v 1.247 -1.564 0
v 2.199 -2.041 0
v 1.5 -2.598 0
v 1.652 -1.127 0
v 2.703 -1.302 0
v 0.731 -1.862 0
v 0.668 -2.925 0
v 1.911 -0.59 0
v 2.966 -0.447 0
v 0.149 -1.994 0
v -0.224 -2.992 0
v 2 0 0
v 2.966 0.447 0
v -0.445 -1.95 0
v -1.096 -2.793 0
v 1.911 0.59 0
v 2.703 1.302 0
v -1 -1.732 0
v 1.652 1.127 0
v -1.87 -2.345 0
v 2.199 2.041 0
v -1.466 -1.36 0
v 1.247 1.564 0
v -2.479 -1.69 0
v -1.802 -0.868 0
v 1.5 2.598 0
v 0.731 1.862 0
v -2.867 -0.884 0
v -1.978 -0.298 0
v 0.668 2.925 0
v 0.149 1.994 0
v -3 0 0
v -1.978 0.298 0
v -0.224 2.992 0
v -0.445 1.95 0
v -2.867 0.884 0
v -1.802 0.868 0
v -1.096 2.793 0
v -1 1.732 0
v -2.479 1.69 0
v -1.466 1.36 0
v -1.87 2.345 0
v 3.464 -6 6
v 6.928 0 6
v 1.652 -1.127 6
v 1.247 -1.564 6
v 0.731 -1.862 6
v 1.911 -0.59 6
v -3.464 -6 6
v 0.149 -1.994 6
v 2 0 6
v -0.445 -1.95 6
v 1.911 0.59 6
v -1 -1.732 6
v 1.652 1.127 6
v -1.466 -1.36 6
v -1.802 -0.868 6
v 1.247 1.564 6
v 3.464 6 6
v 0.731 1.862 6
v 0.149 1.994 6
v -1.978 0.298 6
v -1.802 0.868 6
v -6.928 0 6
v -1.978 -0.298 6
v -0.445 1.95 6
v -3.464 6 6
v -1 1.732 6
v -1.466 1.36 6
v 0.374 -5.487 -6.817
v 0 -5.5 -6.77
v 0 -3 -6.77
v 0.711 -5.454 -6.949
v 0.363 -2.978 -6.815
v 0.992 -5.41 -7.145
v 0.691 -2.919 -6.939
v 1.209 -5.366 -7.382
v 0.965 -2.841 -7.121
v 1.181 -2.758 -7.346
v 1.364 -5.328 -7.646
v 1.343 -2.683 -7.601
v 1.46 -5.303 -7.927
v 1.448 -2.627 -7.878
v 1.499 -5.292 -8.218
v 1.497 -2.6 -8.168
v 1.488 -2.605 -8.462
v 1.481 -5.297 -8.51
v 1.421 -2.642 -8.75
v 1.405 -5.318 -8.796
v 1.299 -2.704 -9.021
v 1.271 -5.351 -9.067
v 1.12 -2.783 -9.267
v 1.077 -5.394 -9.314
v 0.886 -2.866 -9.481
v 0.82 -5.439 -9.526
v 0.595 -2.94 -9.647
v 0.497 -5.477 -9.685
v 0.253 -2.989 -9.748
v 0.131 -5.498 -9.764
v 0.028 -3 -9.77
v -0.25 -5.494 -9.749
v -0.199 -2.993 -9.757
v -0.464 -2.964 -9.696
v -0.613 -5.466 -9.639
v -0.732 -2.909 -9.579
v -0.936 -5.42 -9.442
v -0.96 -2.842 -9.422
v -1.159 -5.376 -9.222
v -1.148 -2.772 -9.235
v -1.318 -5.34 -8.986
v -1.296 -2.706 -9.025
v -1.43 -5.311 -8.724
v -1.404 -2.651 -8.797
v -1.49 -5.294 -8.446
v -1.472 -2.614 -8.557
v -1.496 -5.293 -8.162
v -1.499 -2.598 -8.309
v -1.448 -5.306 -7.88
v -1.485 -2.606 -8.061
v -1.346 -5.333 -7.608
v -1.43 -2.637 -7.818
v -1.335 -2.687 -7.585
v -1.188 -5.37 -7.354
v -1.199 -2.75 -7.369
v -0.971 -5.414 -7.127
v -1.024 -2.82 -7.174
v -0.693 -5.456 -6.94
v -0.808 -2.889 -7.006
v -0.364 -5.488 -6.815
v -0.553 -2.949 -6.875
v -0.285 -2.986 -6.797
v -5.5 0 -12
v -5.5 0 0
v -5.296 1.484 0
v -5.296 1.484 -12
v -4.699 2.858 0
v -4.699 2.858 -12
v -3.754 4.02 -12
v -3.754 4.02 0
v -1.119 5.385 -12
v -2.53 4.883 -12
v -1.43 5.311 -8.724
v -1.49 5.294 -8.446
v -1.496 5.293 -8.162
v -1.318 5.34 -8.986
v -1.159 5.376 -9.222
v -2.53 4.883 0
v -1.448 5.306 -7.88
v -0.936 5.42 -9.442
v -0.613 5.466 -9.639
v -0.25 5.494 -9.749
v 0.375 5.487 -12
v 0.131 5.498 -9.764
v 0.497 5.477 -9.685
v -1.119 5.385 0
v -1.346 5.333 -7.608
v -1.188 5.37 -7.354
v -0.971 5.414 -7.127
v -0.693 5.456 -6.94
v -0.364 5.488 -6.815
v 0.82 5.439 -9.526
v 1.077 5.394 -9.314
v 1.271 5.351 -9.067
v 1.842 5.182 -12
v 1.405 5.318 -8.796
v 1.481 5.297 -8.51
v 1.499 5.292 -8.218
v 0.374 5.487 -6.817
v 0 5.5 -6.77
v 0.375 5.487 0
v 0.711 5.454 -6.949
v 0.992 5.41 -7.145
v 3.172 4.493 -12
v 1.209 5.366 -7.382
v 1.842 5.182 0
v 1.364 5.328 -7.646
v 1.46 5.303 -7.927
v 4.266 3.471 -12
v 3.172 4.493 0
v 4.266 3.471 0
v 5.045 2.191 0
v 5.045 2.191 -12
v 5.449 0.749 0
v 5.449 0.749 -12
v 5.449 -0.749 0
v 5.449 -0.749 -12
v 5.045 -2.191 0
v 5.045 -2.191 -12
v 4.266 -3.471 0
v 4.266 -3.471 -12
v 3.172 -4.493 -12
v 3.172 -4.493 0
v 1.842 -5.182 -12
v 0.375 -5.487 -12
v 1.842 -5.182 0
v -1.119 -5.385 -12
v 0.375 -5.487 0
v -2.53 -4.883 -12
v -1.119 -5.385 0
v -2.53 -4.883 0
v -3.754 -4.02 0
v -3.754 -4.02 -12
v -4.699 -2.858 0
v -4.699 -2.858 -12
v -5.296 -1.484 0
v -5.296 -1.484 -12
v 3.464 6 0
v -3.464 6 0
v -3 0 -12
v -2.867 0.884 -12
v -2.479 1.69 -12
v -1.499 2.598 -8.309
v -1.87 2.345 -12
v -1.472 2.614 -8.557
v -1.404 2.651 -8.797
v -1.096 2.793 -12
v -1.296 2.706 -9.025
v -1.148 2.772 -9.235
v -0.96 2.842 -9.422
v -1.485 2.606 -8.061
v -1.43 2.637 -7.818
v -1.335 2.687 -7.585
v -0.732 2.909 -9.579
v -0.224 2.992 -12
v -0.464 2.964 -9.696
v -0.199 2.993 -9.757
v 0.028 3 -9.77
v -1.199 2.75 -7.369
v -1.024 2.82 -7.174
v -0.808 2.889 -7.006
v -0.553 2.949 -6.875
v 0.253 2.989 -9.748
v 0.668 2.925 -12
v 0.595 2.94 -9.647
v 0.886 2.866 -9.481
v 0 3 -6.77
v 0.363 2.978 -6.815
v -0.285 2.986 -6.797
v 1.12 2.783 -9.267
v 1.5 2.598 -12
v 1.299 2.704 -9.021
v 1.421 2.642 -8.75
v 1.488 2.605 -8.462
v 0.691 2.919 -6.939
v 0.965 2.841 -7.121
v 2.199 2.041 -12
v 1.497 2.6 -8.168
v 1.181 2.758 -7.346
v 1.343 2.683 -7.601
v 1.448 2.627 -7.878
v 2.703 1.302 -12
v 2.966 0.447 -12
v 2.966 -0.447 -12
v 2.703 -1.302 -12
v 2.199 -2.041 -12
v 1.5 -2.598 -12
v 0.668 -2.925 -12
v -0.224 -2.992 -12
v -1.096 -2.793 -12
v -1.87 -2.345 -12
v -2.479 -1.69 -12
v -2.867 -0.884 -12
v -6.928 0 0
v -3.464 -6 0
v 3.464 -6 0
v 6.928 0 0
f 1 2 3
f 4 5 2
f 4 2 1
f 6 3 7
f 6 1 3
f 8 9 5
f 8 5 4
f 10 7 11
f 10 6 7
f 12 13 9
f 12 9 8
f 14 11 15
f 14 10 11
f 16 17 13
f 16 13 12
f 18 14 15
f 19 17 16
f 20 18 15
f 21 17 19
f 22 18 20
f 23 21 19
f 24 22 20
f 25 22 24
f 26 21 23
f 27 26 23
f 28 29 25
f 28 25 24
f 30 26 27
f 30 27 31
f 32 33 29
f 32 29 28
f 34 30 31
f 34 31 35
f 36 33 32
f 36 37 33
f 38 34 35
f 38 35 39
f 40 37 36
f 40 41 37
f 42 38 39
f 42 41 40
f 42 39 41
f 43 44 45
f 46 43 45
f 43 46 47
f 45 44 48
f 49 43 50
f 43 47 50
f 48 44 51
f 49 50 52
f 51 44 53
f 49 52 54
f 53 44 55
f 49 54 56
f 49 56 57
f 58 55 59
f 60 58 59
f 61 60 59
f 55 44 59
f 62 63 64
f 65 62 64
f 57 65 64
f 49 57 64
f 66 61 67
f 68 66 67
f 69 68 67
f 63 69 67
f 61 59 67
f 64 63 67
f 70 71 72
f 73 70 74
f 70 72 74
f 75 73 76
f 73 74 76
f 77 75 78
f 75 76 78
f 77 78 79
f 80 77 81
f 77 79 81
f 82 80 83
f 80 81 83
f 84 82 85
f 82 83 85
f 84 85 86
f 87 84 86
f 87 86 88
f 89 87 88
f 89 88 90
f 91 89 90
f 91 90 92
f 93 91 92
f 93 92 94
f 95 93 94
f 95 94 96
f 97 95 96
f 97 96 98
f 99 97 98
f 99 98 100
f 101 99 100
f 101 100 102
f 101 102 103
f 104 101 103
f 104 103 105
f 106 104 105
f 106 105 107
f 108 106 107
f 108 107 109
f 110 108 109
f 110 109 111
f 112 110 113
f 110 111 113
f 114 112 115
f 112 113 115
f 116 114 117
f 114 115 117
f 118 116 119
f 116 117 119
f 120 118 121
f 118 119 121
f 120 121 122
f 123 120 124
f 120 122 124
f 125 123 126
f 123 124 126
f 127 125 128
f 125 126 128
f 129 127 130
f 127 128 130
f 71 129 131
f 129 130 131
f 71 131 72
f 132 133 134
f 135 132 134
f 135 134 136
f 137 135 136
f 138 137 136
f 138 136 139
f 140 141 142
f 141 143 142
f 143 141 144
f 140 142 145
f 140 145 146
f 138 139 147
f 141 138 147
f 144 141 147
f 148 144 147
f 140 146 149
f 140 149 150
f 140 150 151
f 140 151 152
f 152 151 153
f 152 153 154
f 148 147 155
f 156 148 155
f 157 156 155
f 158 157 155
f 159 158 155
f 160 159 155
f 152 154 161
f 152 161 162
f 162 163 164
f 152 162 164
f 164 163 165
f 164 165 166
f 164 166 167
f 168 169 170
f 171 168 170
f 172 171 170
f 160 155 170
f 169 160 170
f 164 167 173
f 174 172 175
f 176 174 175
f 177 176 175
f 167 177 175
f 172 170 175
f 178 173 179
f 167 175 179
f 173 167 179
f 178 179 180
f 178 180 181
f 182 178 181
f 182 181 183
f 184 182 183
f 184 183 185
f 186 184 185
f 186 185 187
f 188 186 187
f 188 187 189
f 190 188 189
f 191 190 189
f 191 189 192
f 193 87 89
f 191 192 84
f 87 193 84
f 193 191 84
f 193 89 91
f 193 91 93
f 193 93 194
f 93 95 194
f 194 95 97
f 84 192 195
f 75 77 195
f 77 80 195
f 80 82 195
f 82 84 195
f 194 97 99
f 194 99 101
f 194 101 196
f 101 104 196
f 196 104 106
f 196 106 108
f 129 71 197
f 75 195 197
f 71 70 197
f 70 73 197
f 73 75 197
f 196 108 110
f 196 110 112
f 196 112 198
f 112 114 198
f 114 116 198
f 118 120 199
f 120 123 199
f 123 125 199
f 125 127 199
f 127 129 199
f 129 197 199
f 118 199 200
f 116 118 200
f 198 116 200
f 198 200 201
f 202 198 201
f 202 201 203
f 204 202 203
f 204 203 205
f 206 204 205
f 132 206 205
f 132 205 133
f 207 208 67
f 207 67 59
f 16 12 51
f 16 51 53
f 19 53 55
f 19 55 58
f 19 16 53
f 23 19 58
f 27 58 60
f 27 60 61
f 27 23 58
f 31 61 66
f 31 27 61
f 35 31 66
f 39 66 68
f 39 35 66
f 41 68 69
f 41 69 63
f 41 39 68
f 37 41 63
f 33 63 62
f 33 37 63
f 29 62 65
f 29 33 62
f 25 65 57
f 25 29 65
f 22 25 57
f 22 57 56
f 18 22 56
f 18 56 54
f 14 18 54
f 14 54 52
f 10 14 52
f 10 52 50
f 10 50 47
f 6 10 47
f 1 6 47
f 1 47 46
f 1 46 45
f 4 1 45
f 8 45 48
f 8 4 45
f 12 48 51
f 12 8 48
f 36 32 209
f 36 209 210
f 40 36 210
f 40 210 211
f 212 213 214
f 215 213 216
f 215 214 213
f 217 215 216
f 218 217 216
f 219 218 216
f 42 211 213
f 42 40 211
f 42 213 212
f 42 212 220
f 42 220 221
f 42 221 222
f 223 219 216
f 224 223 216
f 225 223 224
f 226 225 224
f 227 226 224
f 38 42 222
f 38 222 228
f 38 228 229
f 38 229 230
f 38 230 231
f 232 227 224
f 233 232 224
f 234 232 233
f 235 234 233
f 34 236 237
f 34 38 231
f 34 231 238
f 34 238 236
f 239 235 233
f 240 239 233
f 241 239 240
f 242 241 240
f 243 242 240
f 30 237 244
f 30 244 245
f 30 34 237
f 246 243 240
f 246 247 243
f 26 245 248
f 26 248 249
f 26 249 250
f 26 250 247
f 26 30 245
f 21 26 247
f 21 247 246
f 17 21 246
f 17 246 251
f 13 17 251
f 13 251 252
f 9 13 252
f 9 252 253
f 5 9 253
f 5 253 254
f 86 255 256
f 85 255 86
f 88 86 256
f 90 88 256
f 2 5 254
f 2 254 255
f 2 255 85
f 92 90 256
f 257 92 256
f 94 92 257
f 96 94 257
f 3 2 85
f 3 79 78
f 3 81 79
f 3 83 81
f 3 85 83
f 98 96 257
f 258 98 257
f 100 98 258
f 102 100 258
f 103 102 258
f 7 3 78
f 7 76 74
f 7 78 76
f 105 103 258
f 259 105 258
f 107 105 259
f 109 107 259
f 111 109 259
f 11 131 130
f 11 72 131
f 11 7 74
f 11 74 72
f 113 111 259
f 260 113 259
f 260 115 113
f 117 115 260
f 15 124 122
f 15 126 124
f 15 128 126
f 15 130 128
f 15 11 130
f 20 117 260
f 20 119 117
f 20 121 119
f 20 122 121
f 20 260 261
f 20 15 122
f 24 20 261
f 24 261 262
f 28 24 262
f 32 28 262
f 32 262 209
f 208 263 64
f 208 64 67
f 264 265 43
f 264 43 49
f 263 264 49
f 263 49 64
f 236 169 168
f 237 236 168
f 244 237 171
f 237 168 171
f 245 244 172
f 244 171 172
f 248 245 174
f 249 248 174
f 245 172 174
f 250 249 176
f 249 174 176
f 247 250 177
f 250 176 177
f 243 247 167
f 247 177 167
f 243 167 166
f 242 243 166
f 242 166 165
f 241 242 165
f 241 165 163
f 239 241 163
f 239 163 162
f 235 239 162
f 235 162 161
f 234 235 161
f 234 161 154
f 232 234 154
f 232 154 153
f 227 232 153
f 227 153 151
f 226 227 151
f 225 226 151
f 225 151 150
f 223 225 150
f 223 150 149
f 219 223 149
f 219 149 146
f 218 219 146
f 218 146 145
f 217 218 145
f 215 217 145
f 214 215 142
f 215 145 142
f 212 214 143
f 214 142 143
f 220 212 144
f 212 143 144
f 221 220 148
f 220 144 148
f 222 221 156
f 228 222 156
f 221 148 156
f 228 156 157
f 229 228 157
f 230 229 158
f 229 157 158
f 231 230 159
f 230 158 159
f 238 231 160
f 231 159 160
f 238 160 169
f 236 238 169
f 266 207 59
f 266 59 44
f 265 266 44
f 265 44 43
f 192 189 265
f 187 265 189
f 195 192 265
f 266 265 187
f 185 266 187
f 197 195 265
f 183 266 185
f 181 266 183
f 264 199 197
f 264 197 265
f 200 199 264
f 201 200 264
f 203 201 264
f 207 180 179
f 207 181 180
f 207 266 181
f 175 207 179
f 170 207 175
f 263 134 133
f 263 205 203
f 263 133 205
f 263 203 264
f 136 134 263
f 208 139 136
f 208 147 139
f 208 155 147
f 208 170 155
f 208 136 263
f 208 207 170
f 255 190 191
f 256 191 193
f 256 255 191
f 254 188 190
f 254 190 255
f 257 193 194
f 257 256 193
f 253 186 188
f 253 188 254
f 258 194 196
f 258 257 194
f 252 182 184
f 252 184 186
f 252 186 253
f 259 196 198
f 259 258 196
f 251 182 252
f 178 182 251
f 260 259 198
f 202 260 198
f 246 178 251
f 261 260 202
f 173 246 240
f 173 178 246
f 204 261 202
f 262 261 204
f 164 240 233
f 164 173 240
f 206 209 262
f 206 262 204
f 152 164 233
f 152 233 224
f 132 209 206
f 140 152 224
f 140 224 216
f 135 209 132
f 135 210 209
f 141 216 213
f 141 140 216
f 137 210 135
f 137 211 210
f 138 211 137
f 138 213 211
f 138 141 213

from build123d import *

# Parameters (mm, degrees)
SKETCH_1_R          = 2
EXTRUDE_1_DEPTH     = 6
SKETCH_2_R          = 5.5
SKETCH_2_R_2        = 3
EXTRUDE_2_DEPTH     = 12
CUT_EXTRUDE_START   = 10
SKETCH_3_R          = 1.5
CUT_EXTRUDE_1_DEPTH = 20


with BuildPart() as part:
    # 草图1 → 凸台-拉伸1 (new body)
    with BuildSketch(Plane.XY):
        Polygon((-3.464101615, 6), (3.464101615, 6), (6.92820323, 0), (3.464101615, -6), (-3.464101615, -6), (-6.92820323, 0), align=None)
        Circle(SKETCH_1_R, mode=Mode.SUBTRACT)
    extrude(amount=EXTRUDE_1_DEPTH)

    # 草图2 → 凸台-拉伸2 (add)
    with BuildSketch(Plane(origin=(0, 0, 0), x_dir=(-1, 0, 0), z_dir=(0, 0, -1))):
        Circle(SKETCH_2_R)
        Circle(SKETCH_2_R_2, mode=Mode.SUBTRACT)
    extrude(amount=EXTRUDE_2_DEPTH)

    # 草图3 → 切除-拉伸1 (cut)
    with BuildSketch(Plane(origin=(0, 0, 0), x_dir=(1, 0, 0), z_dir=(0, 1, 0)).offset(CUT_EXTRUDE_START)):
        with Locations(Location((0, 8.269925745, 0), (0, 0, 270))):
            Circle(SKETCH_3_R)
    extrude(amount=-CUT_EXTRUDE_1_DEPTH, mode=Mode.SUBTRACT)


solid = part.part
